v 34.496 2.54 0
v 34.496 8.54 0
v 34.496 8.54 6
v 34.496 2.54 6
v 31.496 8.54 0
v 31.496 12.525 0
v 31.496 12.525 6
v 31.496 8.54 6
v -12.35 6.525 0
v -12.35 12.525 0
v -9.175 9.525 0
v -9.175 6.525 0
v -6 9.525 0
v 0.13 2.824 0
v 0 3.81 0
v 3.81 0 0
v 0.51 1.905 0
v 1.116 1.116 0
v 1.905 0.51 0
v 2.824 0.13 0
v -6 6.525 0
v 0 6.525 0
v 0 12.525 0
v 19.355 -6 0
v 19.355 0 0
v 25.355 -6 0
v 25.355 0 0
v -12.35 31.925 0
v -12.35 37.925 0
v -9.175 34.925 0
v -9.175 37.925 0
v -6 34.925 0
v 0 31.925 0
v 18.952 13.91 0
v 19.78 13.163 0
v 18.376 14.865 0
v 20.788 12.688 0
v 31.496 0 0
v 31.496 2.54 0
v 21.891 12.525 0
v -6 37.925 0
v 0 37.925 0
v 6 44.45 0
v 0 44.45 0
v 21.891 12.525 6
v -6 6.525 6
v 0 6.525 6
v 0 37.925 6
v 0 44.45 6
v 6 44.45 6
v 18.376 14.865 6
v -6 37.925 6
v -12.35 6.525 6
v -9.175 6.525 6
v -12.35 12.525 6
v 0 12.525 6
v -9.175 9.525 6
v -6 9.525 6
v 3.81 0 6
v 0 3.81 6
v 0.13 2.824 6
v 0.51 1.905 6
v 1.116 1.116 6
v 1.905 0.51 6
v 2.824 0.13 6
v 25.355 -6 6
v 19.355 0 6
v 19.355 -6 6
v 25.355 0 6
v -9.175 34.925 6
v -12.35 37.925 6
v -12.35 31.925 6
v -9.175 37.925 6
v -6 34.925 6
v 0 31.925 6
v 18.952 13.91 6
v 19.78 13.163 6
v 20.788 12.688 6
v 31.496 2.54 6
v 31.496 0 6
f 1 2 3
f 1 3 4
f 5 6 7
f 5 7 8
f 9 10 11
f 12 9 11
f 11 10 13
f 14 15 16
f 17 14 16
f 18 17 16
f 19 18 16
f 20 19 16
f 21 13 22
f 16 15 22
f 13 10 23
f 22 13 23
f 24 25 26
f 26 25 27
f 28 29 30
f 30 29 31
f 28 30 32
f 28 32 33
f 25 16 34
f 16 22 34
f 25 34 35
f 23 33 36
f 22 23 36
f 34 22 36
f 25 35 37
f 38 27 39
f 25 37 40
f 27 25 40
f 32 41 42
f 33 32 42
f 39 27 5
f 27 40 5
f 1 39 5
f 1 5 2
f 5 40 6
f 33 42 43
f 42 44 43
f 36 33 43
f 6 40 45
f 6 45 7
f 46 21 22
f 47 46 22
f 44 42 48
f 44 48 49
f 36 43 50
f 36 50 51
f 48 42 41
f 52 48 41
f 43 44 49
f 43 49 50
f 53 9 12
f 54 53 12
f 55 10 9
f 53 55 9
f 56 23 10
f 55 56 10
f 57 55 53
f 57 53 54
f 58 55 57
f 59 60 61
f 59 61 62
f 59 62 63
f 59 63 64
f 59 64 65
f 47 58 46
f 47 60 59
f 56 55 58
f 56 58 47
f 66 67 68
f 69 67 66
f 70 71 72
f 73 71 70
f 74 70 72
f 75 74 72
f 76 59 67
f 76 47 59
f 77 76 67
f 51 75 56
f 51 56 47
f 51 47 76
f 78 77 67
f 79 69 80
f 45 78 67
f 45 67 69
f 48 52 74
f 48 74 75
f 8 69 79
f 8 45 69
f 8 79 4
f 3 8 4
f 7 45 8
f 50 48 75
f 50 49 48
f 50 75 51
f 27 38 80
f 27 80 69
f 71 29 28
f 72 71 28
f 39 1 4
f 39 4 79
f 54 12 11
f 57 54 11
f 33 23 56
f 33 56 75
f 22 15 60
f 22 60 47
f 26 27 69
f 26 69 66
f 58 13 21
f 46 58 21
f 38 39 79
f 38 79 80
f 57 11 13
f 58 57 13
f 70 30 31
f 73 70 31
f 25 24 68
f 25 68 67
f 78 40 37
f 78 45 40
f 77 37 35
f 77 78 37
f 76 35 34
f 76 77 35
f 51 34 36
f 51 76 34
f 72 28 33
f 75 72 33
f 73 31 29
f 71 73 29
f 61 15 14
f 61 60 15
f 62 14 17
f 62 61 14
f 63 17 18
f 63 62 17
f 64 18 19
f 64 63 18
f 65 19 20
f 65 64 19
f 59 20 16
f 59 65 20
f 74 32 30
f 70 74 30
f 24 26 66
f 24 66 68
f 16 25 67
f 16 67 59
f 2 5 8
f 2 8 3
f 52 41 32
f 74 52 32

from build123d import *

# Parameters (mm, degrees)
BOSS_EXTRUDE1_DEPTH = 6
FILLET1_R           = 3.81


with BuildPart() as part:
    # Sketch1 → Boss-Extrude1 (new body)
    with BuildSketch(Plane.XY):
        Polygon((-12.35, 31.925), (0, 31.925), (0, 37.925), (-6, 37.925), (-6, 34.925), (-9.175, 34.925), (-9.175, 37.925), (-12.35, 37.925), align=None)
        Polygon((19.3548, 12.525), (31.496, 12.525), (31.496, 8.54), (34.496, 8.54), (34.496, 2.54), (31.496, 2.54), (31.496, 0), (25.3548, 0), (25.3548, -6), (19.3548, -6), (19.3548, 0), (0, 0), (0, 44.45), (6, 44.45), align=None)
        Polygon((-6, 6.525), (0, 6.525), (0, 12.525), (-12.35, 12.525), (-12.35, 6.525), (-9.175, 6.525), (-9.175, 9.525), (-6, 9.525), align=None)
    extrude(amount=BOSS_EXTRUDE1_DEPTH)

    # Fillet1
    fillet1_edges = [part.edges().sort_by_distance(p)[0] for p in [
        (19.3548, 12.525, 3),
        (0, 0, 3),
    ]]
    fillet(fillet1_edges, radius=FILLET1_R)


solid = part.part
